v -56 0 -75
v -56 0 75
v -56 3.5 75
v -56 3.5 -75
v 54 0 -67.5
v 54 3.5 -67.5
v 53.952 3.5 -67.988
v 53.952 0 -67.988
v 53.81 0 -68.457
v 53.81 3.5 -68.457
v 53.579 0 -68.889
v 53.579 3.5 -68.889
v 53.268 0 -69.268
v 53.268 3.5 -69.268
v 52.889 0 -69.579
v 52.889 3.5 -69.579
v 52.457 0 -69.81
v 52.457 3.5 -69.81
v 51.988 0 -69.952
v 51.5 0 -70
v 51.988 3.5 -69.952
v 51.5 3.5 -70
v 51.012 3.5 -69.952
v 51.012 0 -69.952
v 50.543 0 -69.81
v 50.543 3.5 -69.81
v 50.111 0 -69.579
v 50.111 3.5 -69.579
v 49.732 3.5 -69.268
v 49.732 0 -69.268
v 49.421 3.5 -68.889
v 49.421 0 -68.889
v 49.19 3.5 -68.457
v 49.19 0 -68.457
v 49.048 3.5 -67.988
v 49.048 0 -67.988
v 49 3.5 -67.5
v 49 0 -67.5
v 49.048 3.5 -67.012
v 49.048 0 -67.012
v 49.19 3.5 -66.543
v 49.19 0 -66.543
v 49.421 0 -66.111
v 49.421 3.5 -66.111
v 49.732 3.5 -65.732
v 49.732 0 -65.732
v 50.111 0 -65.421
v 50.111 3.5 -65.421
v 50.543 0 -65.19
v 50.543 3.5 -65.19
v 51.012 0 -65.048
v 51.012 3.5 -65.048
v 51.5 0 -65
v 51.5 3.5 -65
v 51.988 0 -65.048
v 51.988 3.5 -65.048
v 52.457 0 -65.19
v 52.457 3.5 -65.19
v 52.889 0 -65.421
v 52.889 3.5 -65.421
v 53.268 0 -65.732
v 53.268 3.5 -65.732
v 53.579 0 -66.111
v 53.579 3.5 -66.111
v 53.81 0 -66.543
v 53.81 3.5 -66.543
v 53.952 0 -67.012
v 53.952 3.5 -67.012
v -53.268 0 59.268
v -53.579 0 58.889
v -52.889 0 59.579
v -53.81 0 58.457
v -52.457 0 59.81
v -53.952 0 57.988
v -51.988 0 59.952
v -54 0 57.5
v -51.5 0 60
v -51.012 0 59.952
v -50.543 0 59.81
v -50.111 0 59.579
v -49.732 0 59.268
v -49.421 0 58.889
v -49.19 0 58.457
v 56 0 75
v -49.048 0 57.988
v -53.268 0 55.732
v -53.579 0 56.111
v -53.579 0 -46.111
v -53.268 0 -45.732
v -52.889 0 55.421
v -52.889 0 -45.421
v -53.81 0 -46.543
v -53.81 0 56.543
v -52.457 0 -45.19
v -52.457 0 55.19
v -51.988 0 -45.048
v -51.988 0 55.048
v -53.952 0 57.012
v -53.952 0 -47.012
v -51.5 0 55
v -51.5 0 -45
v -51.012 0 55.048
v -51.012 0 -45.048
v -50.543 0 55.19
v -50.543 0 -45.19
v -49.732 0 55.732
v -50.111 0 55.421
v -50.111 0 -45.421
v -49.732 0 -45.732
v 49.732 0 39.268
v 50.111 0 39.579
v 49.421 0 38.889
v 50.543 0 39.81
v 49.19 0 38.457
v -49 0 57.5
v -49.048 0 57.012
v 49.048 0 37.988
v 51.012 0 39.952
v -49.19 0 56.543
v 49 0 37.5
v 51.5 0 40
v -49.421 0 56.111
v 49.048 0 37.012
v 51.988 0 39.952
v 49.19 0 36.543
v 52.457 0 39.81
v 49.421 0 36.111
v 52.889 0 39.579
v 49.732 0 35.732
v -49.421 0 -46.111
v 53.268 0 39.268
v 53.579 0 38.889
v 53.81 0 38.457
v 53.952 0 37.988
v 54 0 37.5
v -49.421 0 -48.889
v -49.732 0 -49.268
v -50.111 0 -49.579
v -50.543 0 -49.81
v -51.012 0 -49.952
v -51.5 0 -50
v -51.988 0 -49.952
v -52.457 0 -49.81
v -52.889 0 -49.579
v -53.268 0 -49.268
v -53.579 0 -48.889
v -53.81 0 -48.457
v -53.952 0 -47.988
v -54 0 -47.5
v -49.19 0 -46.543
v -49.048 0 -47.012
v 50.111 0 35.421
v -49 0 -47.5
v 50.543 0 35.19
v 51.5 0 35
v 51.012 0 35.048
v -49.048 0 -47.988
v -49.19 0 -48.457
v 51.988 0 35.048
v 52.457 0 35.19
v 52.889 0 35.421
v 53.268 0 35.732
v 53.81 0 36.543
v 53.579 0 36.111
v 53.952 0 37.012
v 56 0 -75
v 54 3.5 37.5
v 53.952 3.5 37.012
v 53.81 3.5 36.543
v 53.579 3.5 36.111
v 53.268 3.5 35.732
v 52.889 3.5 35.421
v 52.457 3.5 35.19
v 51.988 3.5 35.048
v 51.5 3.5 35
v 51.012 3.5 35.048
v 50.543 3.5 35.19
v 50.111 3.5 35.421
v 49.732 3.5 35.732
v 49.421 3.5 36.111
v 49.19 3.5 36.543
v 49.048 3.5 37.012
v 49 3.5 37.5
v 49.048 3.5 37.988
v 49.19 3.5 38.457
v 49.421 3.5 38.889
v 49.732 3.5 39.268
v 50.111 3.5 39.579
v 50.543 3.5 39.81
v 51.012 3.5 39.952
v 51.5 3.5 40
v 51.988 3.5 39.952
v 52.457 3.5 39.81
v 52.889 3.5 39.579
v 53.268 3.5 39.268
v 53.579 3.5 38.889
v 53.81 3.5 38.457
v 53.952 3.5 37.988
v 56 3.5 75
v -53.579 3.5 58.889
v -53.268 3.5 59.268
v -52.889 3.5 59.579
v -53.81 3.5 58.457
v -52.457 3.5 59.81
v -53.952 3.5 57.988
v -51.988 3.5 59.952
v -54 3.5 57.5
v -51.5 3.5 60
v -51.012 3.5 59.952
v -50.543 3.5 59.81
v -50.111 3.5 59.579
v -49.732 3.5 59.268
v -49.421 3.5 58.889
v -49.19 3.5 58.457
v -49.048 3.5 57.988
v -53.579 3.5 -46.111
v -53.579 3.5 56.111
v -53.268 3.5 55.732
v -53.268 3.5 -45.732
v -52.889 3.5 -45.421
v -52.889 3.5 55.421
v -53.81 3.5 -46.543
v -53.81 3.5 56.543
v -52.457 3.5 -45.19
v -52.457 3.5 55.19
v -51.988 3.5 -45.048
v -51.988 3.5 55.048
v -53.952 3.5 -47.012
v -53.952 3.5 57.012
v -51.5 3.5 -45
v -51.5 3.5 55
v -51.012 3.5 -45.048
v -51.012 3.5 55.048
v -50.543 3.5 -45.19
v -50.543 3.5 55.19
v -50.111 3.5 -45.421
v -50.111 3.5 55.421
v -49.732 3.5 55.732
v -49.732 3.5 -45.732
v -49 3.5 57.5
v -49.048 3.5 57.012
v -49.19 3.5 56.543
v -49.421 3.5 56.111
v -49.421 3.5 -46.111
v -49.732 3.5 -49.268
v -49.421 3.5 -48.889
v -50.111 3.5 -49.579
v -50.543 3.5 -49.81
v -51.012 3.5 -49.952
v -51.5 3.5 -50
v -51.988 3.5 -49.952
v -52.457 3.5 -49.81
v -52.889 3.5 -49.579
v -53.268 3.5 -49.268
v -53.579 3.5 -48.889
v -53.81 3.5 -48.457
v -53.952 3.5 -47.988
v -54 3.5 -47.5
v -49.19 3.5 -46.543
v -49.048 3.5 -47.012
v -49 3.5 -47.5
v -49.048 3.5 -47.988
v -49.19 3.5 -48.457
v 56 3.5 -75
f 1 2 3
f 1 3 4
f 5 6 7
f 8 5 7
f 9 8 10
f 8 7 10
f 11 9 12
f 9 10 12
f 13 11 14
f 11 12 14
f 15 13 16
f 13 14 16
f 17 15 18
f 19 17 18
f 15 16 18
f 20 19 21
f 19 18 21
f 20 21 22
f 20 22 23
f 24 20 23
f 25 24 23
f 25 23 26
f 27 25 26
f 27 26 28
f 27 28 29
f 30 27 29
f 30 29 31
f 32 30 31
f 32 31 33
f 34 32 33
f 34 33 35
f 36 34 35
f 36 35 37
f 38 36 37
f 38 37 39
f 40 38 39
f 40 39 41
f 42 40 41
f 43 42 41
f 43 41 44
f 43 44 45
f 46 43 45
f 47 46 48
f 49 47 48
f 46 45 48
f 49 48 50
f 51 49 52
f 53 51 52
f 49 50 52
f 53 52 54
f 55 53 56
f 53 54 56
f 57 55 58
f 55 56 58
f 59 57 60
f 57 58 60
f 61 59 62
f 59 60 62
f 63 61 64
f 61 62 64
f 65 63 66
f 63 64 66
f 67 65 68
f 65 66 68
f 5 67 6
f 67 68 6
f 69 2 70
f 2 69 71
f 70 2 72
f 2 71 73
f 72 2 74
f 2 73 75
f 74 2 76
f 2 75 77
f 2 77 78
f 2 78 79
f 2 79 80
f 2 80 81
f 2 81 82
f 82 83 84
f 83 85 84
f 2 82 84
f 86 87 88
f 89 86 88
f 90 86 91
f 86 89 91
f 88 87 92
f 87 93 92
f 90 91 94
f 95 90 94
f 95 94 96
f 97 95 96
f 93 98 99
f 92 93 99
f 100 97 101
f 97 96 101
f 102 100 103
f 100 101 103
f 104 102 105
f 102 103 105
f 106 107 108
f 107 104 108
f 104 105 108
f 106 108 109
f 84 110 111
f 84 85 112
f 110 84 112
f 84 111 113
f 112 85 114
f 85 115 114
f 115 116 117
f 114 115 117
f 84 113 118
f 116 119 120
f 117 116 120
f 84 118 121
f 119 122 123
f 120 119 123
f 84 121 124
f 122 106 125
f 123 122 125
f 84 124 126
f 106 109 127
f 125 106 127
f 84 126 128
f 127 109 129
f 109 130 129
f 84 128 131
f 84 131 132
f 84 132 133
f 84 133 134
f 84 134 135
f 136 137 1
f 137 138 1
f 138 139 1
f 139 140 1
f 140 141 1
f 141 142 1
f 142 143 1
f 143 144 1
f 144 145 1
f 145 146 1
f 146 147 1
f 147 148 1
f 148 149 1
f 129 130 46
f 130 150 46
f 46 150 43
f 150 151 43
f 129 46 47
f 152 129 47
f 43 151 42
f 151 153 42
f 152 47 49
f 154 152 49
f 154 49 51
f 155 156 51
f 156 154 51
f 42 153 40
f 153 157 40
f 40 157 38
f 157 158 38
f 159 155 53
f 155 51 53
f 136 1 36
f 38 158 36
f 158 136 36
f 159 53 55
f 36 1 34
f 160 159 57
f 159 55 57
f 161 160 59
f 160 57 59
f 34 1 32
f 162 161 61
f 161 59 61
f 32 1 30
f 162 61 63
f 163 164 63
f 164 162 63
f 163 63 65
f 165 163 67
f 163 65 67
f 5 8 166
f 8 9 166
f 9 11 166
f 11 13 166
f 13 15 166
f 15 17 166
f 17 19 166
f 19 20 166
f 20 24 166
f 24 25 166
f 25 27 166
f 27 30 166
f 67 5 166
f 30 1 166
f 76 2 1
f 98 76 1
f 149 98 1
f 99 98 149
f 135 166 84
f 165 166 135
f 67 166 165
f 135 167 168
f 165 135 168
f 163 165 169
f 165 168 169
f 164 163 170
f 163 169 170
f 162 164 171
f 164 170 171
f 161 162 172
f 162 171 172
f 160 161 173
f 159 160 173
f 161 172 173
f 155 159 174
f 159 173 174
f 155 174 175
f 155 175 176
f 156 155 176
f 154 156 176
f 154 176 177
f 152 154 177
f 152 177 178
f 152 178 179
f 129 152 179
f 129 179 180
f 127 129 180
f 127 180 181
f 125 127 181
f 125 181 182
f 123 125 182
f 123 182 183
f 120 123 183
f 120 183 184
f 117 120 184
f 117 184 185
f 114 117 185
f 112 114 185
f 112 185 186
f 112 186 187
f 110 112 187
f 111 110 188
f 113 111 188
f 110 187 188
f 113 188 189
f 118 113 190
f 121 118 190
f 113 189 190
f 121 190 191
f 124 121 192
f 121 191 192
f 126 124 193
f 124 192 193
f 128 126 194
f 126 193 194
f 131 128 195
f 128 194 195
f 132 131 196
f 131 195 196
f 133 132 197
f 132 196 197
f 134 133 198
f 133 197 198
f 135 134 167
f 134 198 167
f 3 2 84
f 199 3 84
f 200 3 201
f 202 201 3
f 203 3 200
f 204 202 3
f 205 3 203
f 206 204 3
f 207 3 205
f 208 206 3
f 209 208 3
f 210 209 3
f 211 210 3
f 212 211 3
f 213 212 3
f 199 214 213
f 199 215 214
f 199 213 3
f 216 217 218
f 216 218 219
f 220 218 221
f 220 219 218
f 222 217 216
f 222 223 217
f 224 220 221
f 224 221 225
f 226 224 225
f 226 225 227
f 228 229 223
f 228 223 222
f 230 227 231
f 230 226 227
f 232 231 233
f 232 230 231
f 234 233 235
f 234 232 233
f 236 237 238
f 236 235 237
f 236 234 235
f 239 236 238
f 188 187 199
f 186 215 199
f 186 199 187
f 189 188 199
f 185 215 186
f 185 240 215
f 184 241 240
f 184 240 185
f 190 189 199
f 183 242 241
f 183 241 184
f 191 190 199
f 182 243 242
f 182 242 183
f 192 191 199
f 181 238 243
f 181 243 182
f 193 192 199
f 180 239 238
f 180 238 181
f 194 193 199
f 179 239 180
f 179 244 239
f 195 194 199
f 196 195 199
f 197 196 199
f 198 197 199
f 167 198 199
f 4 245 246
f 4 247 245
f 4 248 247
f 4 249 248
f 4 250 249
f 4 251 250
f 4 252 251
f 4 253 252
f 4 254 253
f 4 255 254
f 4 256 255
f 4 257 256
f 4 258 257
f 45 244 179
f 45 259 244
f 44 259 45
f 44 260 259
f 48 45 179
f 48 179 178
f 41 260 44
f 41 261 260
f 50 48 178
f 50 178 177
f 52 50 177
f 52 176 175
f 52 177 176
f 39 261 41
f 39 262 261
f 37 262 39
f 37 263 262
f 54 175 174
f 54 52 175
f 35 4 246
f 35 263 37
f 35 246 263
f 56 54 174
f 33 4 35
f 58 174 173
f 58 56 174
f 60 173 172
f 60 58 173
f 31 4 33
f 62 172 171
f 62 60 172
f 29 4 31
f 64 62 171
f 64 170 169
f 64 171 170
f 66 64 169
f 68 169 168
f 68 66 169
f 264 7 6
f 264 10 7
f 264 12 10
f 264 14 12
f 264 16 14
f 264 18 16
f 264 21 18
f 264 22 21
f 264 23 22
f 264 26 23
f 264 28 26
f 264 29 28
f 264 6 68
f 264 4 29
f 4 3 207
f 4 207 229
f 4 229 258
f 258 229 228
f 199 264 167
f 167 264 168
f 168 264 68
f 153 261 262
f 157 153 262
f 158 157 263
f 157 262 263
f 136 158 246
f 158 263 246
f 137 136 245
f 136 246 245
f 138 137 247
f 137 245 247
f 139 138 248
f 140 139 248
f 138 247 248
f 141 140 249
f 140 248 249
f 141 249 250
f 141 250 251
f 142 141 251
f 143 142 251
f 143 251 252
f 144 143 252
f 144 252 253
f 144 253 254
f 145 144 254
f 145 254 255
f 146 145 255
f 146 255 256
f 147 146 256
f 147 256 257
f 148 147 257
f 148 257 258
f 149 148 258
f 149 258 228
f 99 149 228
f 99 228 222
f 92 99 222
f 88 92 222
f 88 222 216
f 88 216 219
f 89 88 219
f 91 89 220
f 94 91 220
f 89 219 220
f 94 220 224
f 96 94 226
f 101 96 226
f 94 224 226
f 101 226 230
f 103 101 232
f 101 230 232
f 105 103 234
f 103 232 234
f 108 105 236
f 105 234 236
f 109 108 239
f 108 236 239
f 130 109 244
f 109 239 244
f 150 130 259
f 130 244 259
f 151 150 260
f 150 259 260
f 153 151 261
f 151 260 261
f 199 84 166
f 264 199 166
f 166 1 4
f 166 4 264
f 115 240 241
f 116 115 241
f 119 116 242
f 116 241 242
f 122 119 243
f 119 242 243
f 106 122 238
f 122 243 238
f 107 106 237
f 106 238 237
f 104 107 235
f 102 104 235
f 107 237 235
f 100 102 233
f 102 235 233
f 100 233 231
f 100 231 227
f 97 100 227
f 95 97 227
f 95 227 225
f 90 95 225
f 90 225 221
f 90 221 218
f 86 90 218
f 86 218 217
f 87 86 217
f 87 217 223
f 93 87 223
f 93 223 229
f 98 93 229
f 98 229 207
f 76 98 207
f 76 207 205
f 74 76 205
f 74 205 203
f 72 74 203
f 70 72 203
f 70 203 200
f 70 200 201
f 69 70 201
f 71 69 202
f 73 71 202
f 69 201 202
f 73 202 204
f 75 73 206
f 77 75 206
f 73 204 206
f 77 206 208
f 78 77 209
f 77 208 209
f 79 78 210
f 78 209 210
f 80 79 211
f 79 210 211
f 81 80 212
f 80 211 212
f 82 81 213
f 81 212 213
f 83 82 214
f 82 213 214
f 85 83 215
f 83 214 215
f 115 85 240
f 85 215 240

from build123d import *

# Parameters (mm, degrees)
ESQUISSE1_W             = 112
ESQUISSE1_H             = 150
BOSS_EXTRU_1_DEPTH      = 3.5
ENL_V_MAT_EXTRU_1_REACH = 5.5
ESQUISSE2_R             = 2.5


with BuildPart() as part:
    # Esquisse1 → Boss.-Extru.1 (new body)
    with BuildSketch(Plane(origin=(0, 0, 0), x_dir=(1, 0, 0), z_dir=(0, 1, 0))):
        Rectangle(ESQUISSE1_W, ESQUISSE1_H)
    extrude(amount=BOSS_EXTRU_1_DEPTH)

    # Esquisse2 → Enlèv. mat.-Extru.1 (cut, up to next)
    with BuildSketch(Plane(origin=(0, 3.5, 0), x_dir=(1, 0, 0), z_dir=(0, 1, 0)), mode=Mode.PRIVATE) as enl_v_mat_extru_1_sk1:
        with Locations((51.5, 67.5)):
            Circle(ESQUISSE2_R)
    enl_v_mat_extru_1_tool1 = extrude(enl_v_mat_extru_1_sk1.sketch, amount=-ENL_V_MAT_EXTRU_1_REACH, mode=Mode.PRIVATE) & part.part
    add(enl_v_mat_extru_1_tool1.solids().sort_by_distance((51.5, 3.5, -67.5))[0], mode=Mode.SUBTRACT)
    # Esquisse2 → Enlèv. mat.-Extru.1 (cut, up to next)
    with BuildSketch(Plane(origin=(0, 3.5, 0), x_dir=(1, 0, 0), z_dir=(0, 1, 0)), mode=Mode.PRIVATE) as enl_v_mat_extru_1_sk2:
        with Locations((-51.5, 47.5)):
            Circle(ESQUISSE2_R)
    enl_v_mat_extru_1_tool2 = extrude(enl_v_mat_extru_1_sk2.sketch, amount=-ENL_V_MAT_EXTRU_1_REACH, mode=Mode.PRIVATE) & part.part
    add(enl_v_mat_extru_1_tool2.solids().sort_by_distance((-51.5, 3.5, -47.5))[0], mode=Mode.SUBTRACT)
    # Esquisse2 → Enlèv. mat.-Extru.1 (cut, up to next)
    with BuildSketch(Plane(origin=(0, 3.5, 0), x_dir=(1, 0, 0), z_dir=(0, 1, 0)), mode=Mode.PRIVATE) as enl_v_mat_extru_1_sk3:
        with Locations((51.5, -37.5)):
            Circle(ESQUISSE2_R)
    enl_v_mat_extru_1_tool3 = extrude(enl_v_mat_extru_1_sk3.sketch, amount=-ENL_V_MAT_EXTRU_1_REACH, mode=Mode.PRIVATE) & part.part
    add(enl_v_mat_extru_1_tool3.solids().sort_by_distance((51.5, 3.5, 37.5))[0], mode=Mode.SUBTRACT)
    # Esquisse2 → Enlèv. mat.-Extru.1 (cut, up to next)
    with BuildSketch(Plane(origin=(0, 3.5, 0), x_dir=(1, 0, 0), z_dir=(0, 1, 0)), mode=Mode.PRIVATE) as enl_v_mat_extru_1_sk4:
        with Locations((-51.5, -57.5)):
            Circle(ESQUISSE2_R)
    enl_v_mat_extru_1_tool4 = extrude(enl_v_mat_extru_1_sk4.sketch, amount=-ENL_V_MAT_EXTRU_1_REACH, mode=Mode.PRIVATE) & part.part
    add(enl_v_mat_extru_1_tool4.solids().sort_by_distance((-51.5, 3.5, 57.5))[0], mode=Mode.SUBTRACT)


solid = part.part
